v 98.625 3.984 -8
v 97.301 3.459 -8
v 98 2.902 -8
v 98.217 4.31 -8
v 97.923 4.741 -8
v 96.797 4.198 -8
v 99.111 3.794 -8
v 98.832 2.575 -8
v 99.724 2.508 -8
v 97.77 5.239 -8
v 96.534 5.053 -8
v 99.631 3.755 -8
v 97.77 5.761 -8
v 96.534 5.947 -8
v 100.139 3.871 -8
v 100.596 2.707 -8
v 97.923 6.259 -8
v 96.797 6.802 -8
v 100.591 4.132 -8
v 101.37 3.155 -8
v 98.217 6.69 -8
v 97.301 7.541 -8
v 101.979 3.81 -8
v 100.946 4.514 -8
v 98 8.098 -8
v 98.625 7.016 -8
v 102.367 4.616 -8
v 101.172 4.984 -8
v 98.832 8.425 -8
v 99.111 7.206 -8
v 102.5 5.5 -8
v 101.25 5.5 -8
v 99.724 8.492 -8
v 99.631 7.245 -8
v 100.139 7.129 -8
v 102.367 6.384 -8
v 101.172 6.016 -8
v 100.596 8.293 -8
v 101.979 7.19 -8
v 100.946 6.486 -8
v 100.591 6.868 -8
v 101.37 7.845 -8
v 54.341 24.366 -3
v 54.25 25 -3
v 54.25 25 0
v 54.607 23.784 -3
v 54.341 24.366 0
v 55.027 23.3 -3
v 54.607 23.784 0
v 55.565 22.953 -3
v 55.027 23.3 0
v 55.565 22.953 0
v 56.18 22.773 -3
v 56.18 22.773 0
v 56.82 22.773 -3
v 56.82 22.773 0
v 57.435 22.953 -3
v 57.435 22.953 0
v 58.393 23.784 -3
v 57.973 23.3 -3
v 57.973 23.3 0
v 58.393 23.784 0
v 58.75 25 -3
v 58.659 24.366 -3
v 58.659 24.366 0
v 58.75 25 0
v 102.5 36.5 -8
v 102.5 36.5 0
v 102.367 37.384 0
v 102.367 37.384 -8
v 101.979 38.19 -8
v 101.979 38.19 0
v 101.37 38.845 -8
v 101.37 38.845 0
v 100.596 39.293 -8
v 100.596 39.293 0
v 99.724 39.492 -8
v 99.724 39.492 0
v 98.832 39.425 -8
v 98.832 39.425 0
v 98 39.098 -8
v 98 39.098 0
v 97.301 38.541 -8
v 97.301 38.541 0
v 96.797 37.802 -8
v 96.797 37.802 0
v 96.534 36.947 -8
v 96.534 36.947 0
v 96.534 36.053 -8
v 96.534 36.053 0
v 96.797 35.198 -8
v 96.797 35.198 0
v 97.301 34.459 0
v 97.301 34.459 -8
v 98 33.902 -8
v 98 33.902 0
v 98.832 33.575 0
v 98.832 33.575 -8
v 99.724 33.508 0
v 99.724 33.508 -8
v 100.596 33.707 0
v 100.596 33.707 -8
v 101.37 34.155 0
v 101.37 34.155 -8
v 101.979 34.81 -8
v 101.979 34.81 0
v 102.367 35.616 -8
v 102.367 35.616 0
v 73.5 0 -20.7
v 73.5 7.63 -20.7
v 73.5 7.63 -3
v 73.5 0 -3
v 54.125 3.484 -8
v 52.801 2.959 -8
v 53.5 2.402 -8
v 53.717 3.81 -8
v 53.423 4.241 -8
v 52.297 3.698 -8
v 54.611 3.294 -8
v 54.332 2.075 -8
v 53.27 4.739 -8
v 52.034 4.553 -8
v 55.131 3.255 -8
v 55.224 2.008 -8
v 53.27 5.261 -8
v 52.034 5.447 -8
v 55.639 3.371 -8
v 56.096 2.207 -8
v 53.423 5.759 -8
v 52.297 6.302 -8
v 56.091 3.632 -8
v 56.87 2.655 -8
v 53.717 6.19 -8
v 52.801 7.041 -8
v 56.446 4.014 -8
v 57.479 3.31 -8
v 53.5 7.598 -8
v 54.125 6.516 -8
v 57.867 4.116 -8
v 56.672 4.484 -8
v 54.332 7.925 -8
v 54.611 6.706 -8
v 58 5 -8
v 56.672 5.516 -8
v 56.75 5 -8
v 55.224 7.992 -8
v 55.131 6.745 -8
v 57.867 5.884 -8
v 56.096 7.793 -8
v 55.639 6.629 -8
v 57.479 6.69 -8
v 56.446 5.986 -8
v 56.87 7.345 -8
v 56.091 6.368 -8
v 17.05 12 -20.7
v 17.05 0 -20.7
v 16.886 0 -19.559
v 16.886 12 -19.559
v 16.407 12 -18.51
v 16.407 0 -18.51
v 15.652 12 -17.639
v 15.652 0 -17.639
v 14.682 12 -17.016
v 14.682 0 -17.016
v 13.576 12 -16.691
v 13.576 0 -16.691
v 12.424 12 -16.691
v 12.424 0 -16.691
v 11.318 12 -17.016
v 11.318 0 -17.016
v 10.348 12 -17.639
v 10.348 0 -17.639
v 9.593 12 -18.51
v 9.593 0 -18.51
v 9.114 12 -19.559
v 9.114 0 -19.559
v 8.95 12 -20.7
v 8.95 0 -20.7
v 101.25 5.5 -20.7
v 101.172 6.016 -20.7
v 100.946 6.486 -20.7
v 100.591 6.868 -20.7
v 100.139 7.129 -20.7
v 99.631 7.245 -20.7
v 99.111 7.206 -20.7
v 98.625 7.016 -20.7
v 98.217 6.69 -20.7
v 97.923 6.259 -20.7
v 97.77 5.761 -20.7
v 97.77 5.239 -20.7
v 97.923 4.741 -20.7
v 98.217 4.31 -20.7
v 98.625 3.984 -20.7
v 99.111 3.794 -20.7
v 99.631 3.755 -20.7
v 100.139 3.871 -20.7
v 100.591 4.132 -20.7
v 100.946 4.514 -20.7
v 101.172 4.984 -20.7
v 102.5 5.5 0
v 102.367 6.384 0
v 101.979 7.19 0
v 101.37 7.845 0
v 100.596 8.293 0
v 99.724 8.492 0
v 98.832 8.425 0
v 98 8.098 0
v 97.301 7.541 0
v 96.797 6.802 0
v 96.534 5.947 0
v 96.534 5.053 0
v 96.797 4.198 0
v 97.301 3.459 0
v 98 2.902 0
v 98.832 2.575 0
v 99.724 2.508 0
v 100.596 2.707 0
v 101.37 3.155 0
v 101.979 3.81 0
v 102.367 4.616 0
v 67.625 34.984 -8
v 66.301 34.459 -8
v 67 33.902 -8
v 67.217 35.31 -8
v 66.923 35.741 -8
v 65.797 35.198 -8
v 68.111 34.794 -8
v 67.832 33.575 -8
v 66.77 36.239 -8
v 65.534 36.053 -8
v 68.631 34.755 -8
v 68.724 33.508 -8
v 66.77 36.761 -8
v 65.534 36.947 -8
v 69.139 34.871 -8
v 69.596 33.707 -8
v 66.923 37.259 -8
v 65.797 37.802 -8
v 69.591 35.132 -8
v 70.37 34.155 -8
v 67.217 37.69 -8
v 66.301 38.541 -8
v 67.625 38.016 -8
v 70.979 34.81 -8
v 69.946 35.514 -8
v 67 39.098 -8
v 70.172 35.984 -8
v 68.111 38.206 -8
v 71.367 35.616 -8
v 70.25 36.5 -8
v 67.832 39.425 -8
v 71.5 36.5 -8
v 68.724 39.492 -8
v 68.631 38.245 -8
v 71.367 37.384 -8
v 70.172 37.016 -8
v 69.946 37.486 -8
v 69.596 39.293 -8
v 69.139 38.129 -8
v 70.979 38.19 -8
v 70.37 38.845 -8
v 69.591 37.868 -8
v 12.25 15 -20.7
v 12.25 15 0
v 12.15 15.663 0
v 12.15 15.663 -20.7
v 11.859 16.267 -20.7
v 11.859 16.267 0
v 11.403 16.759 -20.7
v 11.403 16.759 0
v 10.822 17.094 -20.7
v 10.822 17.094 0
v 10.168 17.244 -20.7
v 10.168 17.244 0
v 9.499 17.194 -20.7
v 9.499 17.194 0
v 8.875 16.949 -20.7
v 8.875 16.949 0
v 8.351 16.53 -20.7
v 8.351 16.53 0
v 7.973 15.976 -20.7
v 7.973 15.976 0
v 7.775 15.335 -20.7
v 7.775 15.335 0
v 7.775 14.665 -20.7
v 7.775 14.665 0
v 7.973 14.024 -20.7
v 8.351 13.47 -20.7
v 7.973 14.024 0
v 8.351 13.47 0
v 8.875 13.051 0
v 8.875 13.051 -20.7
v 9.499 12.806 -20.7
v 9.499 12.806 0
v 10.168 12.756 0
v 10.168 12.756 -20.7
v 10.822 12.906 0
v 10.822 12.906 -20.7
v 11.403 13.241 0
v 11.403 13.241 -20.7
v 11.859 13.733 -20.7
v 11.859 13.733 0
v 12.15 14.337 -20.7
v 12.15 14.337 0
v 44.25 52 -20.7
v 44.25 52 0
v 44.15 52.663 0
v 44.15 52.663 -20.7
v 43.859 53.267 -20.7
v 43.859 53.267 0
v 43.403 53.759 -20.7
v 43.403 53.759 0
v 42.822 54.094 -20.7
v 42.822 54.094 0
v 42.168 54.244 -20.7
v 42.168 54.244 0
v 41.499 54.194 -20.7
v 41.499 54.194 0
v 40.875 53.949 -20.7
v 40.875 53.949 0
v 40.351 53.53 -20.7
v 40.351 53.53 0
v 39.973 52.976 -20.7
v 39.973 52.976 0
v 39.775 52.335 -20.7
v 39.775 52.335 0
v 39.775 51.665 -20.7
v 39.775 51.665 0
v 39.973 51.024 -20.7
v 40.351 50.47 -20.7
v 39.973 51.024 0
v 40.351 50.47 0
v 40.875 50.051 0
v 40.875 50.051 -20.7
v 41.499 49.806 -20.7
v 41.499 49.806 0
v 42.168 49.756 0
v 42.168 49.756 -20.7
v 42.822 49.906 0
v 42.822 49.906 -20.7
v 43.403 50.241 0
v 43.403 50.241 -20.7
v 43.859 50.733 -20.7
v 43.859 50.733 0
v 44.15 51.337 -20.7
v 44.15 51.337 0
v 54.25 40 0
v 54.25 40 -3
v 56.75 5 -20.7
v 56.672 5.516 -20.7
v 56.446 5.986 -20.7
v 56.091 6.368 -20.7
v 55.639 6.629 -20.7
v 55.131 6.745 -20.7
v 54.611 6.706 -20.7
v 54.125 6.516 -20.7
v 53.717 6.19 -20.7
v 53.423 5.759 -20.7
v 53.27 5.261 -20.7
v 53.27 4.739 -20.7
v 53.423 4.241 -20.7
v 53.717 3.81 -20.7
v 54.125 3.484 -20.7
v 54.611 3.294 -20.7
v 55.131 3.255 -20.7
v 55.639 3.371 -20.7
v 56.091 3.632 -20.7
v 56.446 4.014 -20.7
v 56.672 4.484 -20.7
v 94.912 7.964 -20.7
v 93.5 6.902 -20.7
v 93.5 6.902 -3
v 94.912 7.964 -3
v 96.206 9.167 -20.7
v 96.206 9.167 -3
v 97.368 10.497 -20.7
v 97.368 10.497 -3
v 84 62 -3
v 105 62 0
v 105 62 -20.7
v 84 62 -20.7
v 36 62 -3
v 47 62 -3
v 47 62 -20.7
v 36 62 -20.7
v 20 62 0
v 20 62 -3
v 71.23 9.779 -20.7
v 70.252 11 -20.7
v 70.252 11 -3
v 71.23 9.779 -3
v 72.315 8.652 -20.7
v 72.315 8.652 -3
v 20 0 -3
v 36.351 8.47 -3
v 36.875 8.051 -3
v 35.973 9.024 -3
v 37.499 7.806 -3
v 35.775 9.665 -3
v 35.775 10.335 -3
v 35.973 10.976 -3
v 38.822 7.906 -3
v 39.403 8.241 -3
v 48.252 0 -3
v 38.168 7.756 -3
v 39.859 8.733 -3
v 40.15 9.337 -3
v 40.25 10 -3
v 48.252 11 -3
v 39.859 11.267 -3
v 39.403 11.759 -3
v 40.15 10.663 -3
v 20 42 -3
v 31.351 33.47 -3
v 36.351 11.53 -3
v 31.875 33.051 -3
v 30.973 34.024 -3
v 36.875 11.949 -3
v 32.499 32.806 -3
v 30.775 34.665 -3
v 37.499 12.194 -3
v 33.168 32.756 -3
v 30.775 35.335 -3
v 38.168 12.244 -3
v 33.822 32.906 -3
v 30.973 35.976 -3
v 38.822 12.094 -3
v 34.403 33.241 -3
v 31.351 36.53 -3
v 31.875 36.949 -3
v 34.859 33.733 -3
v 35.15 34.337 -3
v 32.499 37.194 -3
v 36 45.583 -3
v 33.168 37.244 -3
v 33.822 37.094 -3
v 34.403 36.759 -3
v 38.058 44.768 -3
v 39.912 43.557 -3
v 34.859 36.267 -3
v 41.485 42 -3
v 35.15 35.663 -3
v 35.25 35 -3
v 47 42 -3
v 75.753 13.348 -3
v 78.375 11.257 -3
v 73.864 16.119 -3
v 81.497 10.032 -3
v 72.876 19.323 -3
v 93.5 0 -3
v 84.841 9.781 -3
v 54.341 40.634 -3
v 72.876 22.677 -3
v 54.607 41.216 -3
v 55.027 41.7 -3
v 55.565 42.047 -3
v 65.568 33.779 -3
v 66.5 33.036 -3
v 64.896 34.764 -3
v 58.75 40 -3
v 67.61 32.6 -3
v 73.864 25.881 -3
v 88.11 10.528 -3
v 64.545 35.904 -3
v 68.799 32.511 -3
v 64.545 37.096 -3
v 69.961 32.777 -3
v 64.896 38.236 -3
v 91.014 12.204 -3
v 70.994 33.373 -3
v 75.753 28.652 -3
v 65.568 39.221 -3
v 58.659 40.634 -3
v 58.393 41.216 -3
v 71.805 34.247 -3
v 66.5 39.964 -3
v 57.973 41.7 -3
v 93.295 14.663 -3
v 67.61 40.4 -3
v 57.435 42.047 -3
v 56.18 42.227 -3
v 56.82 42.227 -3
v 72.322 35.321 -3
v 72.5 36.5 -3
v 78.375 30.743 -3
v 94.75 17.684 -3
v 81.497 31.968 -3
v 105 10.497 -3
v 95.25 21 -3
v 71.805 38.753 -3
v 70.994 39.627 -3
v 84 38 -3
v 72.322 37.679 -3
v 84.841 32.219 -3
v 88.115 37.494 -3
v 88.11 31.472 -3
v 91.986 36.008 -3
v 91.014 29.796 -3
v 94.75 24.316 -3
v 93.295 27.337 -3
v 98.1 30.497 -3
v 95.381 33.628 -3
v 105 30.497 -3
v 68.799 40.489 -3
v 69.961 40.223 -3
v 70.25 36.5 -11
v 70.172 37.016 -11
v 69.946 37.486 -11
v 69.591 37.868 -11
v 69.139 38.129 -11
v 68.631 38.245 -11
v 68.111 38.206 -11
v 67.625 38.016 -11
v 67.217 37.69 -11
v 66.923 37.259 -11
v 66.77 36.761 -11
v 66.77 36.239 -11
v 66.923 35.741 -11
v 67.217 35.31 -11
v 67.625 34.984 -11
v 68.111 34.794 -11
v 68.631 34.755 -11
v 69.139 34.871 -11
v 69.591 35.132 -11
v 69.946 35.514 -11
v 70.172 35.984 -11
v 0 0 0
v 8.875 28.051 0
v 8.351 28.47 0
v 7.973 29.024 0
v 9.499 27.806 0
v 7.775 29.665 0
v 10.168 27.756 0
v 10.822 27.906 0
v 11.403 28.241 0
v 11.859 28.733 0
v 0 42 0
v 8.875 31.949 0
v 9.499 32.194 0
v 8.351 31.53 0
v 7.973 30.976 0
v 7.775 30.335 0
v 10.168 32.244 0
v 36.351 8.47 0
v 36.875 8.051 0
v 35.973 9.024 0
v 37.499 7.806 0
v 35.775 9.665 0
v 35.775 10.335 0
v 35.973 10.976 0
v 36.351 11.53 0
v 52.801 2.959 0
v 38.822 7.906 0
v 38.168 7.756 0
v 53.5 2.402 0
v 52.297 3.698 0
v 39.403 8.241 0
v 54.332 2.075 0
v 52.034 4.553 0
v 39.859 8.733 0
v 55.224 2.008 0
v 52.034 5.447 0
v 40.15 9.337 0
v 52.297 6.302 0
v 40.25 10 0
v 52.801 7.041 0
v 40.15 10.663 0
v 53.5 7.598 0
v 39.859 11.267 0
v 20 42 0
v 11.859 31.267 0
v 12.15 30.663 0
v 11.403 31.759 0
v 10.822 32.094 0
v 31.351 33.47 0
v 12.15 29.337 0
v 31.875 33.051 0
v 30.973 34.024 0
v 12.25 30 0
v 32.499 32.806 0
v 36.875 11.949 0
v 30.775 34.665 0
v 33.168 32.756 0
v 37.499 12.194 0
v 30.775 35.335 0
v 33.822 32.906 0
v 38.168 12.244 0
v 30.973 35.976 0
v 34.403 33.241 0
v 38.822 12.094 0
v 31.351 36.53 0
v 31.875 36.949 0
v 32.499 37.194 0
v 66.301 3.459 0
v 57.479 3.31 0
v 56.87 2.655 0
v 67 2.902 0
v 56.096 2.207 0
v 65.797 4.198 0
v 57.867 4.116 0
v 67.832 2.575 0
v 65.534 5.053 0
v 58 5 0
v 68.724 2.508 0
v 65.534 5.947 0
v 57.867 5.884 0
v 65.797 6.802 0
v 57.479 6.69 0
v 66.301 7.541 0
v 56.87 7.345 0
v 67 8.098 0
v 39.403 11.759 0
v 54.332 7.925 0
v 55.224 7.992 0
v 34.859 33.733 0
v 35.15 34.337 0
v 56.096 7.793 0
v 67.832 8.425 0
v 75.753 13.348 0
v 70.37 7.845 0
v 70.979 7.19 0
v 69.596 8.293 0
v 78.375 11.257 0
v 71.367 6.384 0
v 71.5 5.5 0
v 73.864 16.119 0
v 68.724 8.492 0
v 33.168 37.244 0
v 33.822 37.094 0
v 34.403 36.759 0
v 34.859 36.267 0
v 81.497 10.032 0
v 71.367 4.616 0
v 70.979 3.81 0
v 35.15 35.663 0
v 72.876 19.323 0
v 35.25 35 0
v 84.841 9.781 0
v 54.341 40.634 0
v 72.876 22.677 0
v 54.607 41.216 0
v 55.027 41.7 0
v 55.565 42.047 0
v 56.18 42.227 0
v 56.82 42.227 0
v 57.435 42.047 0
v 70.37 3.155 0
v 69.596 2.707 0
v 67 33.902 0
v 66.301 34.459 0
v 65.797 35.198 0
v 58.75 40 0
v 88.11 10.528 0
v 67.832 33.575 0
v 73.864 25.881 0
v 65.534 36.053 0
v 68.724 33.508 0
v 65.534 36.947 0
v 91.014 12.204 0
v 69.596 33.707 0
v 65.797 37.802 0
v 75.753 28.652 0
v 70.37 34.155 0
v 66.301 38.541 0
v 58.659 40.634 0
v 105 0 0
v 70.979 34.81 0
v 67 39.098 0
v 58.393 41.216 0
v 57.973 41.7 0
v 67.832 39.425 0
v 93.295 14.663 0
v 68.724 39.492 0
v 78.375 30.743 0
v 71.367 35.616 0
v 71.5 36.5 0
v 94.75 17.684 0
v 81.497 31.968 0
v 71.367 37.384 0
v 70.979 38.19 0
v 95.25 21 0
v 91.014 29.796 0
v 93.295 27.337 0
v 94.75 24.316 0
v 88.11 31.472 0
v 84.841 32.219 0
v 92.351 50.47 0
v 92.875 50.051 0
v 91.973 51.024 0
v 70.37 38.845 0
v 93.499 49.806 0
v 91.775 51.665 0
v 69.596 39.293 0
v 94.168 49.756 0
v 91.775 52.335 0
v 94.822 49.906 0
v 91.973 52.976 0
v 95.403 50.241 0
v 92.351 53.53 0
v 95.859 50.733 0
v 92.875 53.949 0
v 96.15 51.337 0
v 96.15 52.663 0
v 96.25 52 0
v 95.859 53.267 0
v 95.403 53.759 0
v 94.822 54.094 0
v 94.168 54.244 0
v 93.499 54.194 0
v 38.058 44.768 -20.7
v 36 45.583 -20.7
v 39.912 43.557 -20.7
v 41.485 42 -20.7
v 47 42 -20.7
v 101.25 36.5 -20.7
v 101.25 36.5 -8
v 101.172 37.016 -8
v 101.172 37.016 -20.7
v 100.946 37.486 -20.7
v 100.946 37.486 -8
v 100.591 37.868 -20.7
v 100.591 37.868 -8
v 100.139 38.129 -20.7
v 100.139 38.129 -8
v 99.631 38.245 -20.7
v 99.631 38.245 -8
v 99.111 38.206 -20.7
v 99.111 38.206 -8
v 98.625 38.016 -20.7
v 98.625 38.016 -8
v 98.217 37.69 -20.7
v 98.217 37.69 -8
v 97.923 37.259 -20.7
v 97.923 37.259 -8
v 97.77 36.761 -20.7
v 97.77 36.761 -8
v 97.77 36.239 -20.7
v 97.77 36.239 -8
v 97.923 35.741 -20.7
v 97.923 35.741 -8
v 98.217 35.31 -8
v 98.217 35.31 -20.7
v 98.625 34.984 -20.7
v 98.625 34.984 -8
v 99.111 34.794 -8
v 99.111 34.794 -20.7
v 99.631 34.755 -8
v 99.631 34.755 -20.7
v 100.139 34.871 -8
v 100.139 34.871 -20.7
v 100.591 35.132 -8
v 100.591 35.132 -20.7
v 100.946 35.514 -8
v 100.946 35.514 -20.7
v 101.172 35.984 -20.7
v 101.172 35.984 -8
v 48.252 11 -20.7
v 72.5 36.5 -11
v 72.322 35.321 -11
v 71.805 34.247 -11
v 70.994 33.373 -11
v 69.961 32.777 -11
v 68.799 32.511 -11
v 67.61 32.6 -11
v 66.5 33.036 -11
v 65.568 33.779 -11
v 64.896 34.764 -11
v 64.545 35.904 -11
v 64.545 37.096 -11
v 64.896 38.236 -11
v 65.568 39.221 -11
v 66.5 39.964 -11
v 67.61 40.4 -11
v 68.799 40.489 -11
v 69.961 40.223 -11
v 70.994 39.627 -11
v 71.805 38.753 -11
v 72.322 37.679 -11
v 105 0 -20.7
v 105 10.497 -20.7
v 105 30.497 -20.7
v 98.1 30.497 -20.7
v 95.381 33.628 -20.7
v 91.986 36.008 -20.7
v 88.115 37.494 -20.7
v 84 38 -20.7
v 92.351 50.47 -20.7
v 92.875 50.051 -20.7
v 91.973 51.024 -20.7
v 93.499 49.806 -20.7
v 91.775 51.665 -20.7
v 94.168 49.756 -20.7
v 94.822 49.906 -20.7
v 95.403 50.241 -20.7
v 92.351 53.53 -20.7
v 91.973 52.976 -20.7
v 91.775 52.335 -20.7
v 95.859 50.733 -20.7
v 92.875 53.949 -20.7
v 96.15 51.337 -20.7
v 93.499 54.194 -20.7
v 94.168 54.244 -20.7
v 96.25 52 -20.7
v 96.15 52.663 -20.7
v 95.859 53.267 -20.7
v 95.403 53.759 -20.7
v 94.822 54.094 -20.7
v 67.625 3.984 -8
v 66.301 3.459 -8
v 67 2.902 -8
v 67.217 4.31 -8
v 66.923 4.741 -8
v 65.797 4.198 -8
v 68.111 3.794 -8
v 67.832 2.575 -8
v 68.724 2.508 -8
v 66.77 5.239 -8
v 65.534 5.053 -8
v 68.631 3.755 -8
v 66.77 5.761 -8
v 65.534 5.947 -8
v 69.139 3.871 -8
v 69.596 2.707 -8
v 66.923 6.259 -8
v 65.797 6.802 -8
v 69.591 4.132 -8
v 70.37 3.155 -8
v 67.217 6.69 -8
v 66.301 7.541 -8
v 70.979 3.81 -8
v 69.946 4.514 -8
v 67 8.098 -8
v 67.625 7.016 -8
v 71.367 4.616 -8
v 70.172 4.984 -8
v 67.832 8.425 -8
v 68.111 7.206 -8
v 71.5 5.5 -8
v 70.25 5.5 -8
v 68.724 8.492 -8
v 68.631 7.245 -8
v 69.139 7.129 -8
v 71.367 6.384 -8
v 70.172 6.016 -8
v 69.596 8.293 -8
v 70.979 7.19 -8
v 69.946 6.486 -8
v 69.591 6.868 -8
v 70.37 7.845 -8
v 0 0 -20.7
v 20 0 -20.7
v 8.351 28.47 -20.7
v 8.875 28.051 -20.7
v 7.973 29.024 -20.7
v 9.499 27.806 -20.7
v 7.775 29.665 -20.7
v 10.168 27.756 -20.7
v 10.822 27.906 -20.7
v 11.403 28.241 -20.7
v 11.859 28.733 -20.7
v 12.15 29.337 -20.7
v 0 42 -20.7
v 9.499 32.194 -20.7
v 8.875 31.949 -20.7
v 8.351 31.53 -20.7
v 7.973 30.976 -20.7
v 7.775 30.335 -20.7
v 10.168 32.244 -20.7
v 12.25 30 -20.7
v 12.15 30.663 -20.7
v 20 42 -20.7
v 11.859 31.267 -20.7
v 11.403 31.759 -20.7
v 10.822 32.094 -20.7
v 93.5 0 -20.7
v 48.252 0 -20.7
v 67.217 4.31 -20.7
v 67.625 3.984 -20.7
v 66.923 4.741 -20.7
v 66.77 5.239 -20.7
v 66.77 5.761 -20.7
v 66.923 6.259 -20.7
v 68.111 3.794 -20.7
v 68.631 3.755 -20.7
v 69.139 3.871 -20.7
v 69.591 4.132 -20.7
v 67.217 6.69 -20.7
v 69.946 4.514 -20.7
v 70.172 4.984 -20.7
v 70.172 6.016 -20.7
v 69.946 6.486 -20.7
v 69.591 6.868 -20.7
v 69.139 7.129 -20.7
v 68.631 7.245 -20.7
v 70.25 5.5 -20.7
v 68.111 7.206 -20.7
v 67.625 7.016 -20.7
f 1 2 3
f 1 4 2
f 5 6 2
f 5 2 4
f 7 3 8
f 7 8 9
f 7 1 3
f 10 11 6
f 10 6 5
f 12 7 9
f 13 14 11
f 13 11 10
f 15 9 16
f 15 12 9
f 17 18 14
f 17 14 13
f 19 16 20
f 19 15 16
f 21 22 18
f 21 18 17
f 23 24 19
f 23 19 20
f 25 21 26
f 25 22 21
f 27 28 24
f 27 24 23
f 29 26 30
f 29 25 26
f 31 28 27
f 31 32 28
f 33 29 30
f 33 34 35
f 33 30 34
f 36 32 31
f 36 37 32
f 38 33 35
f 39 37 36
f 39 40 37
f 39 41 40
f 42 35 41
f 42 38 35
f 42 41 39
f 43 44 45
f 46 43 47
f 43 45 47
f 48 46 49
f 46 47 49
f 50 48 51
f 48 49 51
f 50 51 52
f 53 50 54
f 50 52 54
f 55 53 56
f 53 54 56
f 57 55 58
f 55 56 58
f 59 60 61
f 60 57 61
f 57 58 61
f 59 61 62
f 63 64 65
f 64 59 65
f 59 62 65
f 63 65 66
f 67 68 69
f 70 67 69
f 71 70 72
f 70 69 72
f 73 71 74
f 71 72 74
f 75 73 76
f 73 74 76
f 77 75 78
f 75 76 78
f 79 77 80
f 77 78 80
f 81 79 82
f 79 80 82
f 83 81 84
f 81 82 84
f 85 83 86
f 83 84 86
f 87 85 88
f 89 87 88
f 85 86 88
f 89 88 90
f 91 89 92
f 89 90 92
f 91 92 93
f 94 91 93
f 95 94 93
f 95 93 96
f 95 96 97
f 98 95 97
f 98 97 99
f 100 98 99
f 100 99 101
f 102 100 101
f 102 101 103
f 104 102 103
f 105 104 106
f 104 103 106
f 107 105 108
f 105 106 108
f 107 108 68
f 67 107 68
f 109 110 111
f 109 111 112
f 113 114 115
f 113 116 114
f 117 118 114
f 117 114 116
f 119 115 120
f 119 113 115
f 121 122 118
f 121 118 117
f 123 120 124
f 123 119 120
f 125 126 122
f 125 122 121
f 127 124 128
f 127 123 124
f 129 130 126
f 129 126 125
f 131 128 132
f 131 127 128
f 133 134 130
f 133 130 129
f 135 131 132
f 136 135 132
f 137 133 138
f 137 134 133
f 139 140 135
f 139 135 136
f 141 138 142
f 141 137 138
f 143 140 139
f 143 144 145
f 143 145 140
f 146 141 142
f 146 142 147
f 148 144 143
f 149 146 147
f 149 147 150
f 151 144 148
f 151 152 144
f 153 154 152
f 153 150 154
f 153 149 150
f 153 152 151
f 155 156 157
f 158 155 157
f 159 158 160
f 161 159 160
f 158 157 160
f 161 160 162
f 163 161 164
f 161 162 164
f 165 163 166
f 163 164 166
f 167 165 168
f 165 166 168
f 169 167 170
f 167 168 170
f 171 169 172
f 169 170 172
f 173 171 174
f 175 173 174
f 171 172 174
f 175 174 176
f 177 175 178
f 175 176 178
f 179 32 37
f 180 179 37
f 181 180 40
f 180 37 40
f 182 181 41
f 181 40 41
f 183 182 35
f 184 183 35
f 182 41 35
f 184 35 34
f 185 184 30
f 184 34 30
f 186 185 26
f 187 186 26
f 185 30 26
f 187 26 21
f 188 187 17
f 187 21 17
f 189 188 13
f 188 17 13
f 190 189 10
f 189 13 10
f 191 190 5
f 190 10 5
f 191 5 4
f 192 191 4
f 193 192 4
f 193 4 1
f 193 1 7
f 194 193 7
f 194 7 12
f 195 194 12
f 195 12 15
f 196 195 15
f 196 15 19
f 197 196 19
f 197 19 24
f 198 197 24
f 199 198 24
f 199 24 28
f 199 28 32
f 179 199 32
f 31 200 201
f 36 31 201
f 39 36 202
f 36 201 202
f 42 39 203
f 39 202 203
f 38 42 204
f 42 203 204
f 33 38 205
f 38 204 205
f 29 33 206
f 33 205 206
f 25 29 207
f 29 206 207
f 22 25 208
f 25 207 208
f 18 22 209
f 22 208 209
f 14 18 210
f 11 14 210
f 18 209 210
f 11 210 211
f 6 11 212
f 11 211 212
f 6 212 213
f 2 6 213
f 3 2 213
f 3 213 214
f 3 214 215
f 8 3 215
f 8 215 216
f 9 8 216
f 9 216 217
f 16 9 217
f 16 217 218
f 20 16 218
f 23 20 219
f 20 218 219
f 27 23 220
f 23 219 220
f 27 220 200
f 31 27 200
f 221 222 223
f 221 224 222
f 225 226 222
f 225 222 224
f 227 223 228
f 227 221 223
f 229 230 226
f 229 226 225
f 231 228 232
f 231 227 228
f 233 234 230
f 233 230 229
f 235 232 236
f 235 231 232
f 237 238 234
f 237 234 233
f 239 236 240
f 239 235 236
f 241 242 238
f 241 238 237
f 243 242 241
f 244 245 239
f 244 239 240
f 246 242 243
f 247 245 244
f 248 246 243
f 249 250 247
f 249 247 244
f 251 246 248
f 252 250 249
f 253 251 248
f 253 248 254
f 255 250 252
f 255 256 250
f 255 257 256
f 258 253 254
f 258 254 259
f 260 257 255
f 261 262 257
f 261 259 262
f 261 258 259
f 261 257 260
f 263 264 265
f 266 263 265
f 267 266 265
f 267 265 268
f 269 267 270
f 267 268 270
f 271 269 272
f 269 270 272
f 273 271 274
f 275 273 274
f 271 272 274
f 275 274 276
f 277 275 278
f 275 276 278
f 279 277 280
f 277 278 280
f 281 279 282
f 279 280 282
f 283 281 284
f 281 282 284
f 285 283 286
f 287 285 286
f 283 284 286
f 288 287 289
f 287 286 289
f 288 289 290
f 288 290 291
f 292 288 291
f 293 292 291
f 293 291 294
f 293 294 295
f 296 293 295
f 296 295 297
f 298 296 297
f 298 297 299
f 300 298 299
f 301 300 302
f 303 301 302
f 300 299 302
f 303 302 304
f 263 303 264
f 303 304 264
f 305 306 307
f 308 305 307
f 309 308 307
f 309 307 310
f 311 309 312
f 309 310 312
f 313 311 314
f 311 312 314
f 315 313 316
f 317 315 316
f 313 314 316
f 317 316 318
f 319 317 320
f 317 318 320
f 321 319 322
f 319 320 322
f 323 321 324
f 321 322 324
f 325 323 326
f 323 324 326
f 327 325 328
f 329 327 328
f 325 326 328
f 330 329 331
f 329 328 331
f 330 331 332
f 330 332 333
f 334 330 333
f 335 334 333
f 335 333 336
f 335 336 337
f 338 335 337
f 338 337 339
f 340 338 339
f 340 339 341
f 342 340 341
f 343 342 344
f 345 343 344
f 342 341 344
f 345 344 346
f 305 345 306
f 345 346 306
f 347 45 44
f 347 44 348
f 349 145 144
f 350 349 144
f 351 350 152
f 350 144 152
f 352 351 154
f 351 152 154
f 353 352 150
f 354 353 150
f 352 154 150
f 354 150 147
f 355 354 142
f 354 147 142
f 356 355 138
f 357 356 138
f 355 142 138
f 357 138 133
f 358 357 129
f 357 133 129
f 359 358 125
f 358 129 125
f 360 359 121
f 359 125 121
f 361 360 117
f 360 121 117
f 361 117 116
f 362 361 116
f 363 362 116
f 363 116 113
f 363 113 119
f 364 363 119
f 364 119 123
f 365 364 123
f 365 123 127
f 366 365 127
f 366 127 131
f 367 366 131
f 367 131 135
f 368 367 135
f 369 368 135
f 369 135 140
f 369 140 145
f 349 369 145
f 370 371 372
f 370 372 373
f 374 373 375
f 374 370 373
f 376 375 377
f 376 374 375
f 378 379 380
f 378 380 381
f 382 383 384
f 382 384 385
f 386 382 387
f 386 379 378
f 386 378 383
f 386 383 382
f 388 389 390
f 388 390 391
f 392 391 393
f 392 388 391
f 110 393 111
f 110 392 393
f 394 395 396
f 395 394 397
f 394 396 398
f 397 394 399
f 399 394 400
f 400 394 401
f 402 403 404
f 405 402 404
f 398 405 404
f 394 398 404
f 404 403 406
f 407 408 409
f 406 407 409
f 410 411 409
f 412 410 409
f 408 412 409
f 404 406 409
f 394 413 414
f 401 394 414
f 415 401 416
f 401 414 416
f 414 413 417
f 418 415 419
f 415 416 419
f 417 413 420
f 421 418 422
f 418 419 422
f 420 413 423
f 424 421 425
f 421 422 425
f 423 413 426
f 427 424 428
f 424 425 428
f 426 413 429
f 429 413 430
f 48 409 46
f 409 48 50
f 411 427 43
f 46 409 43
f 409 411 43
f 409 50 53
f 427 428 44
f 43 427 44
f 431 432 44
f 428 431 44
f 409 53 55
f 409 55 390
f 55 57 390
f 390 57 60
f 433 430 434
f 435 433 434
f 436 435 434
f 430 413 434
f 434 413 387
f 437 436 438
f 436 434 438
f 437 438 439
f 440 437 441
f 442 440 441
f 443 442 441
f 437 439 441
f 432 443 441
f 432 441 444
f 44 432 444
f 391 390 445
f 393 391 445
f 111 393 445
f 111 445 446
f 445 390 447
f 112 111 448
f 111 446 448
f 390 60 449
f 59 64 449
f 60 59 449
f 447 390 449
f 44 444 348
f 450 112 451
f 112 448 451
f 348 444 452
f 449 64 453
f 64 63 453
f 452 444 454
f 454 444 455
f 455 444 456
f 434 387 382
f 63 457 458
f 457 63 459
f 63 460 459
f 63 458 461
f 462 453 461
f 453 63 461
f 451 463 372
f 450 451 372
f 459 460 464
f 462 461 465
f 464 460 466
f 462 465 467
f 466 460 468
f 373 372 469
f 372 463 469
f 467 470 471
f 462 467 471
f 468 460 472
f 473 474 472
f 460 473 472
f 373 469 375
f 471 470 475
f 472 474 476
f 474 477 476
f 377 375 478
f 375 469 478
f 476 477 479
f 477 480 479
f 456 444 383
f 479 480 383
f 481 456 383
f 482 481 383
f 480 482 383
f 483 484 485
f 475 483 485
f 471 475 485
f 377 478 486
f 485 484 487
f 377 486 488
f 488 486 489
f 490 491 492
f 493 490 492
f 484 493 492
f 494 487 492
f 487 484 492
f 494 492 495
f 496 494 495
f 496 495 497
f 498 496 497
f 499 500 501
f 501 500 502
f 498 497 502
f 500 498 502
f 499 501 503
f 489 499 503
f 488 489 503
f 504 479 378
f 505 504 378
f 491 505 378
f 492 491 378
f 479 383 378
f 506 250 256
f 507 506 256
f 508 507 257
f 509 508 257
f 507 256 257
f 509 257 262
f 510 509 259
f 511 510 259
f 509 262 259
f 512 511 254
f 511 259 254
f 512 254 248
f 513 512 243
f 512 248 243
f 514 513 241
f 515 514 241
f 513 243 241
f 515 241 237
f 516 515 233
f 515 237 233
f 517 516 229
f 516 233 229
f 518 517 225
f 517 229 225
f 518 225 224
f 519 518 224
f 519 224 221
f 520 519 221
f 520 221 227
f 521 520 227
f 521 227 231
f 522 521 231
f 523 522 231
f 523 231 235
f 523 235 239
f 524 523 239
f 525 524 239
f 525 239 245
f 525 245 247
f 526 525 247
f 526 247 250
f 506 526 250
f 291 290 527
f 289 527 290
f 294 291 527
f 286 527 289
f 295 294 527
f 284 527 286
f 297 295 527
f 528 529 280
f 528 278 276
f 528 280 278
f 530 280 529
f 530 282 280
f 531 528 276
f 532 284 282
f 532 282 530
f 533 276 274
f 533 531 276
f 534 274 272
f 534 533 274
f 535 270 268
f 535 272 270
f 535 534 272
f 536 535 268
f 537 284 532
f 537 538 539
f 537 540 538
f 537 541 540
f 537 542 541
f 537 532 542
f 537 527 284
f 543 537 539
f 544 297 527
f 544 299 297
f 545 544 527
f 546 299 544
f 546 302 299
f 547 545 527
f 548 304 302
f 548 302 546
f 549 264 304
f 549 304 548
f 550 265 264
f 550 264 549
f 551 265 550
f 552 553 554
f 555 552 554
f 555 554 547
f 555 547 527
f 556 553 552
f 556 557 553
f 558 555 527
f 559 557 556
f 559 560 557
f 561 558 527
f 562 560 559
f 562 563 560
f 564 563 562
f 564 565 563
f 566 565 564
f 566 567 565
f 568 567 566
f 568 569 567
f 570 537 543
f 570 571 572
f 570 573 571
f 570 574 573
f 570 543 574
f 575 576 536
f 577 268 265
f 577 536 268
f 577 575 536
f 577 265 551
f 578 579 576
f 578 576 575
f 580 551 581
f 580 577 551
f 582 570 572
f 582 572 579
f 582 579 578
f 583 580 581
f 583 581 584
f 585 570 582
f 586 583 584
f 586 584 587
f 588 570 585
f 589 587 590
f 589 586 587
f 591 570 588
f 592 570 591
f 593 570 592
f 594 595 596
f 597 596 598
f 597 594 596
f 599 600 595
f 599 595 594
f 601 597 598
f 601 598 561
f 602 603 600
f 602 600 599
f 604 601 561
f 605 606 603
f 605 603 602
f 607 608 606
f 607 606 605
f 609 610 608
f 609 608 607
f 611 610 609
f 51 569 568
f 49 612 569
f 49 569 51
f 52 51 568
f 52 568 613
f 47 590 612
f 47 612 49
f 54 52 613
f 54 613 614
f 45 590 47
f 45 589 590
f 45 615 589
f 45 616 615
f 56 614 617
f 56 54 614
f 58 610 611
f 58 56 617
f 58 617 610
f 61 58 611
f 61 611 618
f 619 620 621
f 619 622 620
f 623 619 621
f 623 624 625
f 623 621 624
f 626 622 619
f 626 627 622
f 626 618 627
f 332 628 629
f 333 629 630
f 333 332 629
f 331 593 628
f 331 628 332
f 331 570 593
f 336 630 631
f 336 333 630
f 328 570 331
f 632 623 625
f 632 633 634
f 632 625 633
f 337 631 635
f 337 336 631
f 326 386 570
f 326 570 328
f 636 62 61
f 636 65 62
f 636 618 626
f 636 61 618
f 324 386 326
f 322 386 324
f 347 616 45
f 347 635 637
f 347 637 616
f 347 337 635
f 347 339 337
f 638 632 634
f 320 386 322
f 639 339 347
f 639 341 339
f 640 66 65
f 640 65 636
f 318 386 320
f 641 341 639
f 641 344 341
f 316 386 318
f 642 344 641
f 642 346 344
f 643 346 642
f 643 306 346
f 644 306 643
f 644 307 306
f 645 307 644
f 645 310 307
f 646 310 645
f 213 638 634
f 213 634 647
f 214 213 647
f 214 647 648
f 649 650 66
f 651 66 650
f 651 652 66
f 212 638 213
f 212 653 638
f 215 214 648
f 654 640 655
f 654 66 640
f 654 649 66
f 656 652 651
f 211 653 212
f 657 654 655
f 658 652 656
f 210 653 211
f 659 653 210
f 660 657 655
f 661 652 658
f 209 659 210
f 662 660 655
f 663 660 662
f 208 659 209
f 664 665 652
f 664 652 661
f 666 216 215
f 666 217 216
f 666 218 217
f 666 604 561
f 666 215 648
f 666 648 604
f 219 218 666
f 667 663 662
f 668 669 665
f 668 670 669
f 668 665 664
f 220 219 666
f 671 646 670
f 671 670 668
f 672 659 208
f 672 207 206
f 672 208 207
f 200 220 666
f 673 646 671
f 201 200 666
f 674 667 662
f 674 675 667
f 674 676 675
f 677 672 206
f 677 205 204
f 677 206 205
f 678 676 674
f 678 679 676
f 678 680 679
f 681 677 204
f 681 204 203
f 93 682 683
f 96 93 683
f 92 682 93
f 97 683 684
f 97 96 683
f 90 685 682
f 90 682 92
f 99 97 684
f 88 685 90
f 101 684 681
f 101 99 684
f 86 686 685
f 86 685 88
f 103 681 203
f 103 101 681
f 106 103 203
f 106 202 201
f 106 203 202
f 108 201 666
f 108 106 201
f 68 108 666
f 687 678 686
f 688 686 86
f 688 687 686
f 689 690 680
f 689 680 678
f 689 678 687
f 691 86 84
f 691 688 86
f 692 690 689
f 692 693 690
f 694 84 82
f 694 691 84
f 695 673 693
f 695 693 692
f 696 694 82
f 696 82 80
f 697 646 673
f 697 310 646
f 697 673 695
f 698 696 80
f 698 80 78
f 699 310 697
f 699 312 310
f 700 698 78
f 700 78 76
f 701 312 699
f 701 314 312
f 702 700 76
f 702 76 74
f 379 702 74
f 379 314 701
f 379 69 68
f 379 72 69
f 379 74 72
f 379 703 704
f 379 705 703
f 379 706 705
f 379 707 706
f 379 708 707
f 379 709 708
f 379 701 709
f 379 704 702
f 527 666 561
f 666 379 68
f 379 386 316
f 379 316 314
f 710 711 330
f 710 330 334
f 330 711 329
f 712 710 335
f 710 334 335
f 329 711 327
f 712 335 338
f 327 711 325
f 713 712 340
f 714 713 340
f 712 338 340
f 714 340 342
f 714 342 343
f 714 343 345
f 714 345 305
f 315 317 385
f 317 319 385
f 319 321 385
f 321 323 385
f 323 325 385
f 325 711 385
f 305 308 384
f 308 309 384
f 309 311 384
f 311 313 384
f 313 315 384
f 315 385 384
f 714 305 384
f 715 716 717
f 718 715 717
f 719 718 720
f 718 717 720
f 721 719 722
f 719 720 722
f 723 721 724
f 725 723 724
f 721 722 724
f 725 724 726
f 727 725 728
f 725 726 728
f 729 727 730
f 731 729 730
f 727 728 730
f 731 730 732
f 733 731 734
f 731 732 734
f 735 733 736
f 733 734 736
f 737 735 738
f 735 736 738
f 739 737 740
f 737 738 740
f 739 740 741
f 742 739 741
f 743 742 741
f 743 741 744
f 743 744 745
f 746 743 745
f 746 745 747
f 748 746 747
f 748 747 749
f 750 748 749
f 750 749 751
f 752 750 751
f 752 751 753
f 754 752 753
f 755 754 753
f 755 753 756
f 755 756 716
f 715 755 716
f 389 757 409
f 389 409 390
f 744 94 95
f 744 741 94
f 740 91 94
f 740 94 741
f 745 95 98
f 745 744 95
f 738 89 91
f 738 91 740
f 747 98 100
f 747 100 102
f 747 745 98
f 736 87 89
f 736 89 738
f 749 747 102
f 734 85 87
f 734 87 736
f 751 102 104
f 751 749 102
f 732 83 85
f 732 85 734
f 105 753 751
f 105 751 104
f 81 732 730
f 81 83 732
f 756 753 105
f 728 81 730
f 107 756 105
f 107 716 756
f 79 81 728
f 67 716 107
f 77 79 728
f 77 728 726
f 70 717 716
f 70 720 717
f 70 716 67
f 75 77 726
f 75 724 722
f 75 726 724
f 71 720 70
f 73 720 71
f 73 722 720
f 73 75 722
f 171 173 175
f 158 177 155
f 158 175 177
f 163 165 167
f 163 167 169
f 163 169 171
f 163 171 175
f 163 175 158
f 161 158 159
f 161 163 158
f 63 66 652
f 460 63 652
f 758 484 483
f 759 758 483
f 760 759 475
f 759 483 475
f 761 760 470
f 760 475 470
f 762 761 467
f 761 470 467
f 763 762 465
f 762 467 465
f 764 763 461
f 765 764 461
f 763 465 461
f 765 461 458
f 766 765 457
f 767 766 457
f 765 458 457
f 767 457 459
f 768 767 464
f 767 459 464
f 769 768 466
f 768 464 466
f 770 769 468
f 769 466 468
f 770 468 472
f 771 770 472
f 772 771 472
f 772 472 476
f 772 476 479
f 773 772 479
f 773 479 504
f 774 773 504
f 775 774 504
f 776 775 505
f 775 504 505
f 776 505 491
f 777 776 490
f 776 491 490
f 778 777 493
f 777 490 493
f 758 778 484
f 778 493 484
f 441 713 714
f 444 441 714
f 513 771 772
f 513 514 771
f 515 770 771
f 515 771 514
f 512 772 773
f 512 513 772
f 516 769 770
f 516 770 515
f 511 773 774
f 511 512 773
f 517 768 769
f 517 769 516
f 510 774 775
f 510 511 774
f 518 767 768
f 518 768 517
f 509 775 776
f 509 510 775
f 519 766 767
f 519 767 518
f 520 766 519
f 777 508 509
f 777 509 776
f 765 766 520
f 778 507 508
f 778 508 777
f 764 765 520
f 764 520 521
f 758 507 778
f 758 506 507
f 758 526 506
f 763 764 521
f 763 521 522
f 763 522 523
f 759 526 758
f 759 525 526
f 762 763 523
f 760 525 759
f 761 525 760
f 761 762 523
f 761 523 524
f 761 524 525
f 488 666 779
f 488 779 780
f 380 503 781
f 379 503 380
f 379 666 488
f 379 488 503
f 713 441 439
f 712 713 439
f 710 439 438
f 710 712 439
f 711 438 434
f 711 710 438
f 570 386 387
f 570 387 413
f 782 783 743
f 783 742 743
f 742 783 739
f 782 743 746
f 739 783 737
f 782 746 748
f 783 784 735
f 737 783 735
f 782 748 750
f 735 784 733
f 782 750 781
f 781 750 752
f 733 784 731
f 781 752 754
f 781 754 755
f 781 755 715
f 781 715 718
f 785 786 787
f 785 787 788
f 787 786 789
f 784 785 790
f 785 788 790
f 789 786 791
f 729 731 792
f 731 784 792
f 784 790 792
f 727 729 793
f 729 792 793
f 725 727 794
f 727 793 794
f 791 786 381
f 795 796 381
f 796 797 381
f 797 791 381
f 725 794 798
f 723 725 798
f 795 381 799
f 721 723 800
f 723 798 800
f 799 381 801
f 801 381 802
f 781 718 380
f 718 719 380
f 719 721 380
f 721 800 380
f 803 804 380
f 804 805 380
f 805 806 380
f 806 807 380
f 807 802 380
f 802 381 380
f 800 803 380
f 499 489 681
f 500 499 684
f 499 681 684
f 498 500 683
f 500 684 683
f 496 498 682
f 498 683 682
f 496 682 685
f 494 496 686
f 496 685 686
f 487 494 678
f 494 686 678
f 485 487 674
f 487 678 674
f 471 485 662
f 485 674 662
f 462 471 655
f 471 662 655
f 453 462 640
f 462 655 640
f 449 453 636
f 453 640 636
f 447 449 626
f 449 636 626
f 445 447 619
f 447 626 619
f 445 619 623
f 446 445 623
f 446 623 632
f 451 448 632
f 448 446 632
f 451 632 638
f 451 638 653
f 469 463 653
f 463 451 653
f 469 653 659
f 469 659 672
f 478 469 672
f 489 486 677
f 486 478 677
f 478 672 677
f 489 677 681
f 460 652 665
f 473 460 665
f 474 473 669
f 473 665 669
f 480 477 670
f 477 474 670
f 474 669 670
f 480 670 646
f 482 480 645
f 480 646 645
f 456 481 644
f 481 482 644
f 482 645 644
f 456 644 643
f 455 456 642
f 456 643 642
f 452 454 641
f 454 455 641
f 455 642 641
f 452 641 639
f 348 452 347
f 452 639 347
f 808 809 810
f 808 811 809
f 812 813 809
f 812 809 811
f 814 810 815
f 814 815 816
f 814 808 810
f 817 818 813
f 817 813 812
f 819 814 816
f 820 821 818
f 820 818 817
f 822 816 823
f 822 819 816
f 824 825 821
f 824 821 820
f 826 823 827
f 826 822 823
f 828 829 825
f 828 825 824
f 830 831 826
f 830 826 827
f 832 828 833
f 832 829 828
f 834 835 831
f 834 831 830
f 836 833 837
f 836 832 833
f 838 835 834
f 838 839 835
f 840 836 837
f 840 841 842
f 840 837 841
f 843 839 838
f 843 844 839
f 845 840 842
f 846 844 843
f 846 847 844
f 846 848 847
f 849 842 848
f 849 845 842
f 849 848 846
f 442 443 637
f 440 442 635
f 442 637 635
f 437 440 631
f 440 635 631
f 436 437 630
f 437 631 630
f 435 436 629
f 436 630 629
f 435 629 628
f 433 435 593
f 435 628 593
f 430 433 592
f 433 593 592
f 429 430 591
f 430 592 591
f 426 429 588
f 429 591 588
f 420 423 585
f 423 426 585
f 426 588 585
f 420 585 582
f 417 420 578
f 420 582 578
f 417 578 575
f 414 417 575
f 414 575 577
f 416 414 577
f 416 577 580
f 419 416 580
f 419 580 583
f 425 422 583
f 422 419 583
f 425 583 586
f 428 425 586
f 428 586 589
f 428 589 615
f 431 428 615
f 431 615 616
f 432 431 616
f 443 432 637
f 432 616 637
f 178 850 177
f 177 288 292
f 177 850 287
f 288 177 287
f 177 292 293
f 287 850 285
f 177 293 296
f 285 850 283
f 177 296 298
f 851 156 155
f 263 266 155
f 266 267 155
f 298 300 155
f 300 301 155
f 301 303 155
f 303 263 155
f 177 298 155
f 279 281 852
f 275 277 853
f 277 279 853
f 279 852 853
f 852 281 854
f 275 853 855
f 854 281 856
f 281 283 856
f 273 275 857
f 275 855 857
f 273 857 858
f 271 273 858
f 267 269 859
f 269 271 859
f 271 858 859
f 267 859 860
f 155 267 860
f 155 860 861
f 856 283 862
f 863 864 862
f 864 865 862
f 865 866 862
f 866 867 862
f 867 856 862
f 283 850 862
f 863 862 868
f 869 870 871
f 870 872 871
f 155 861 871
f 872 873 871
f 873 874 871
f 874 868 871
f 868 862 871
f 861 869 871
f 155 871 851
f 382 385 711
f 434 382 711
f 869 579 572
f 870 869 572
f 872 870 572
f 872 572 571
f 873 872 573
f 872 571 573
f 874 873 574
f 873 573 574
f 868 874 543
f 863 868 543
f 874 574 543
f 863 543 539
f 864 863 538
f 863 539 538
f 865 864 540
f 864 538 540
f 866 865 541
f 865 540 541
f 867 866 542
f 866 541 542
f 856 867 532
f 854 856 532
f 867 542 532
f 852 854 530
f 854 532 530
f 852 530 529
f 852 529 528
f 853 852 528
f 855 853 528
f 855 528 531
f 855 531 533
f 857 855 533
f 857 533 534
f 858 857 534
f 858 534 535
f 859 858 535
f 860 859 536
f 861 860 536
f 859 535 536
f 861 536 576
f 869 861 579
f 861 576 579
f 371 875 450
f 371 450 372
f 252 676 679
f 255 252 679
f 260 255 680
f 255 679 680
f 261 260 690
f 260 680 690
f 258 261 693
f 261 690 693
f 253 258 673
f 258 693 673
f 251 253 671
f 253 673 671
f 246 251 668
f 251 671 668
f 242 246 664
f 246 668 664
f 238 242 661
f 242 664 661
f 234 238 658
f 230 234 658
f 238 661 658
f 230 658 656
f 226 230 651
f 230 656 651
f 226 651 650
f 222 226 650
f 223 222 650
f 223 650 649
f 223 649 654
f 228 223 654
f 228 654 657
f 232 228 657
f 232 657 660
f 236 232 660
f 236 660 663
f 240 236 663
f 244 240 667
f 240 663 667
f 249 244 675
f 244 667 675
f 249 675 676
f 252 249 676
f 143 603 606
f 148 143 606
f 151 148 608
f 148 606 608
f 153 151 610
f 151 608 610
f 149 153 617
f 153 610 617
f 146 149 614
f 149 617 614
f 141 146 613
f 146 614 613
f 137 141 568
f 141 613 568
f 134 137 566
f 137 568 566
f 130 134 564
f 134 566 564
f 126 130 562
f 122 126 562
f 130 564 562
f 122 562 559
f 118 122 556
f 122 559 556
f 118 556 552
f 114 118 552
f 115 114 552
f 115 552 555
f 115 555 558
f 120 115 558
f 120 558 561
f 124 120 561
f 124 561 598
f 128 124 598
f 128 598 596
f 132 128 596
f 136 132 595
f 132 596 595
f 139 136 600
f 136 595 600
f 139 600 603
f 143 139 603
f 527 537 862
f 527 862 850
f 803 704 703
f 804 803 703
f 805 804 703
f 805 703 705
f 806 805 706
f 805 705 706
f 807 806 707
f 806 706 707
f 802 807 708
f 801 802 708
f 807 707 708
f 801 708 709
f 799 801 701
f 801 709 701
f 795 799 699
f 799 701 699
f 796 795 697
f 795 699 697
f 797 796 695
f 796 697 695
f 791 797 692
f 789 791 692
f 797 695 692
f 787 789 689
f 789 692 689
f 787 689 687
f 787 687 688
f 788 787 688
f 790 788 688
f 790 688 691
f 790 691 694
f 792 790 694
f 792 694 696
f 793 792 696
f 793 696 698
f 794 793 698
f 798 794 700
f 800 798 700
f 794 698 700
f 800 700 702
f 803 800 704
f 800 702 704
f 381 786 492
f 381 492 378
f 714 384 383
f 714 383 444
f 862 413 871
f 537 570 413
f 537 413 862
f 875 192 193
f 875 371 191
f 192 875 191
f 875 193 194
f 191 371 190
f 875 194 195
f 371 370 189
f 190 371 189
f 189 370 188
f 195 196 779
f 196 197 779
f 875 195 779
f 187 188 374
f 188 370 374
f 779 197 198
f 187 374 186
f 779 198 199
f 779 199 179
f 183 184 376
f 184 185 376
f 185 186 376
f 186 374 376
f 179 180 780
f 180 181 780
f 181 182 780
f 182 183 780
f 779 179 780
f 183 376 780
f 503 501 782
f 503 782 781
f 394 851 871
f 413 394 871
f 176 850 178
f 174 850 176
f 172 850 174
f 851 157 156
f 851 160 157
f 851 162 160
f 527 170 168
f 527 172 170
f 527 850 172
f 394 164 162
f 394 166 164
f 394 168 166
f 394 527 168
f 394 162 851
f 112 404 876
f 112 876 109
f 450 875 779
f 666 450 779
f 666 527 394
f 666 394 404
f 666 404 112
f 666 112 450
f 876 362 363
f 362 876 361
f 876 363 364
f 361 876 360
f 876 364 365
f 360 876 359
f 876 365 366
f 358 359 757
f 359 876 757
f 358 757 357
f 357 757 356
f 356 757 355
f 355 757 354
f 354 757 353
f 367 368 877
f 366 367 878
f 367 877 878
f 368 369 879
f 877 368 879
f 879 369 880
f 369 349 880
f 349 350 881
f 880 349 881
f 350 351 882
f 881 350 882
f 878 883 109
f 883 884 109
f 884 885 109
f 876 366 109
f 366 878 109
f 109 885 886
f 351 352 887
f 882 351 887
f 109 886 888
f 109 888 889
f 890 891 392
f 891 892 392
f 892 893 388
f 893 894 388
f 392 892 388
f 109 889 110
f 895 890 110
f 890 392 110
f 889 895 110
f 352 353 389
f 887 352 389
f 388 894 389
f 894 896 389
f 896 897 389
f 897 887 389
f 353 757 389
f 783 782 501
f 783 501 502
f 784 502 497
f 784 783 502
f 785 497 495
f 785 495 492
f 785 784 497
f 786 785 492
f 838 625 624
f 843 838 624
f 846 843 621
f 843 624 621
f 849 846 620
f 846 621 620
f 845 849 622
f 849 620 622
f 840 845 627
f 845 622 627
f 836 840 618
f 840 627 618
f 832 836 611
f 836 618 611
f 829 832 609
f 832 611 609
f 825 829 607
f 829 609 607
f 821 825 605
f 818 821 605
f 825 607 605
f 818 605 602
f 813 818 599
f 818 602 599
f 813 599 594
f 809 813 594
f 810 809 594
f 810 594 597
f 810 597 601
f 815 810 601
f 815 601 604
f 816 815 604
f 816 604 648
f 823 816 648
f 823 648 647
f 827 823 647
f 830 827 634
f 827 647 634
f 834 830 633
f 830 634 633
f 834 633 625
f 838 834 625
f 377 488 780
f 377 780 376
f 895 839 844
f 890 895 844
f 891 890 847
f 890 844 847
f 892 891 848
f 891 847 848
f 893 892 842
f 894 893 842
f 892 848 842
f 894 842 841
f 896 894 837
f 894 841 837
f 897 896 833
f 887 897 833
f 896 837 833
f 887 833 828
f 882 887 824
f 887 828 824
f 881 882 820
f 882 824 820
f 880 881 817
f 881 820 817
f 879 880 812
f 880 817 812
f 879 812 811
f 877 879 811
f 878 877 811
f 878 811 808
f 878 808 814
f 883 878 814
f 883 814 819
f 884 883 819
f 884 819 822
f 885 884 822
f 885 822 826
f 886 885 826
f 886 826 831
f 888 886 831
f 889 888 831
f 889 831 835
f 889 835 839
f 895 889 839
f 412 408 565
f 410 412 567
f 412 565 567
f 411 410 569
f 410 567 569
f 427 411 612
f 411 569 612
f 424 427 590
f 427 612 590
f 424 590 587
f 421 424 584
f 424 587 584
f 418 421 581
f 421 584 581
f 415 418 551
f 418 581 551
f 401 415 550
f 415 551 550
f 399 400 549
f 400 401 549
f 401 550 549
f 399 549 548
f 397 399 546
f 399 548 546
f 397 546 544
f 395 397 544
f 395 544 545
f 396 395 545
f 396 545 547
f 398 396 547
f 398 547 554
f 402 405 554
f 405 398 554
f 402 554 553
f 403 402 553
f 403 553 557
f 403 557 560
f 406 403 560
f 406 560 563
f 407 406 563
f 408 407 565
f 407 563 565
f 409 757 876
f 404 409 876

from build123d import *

# Parameters (mm, degrees)
SKETCH_R        = 2.25
SKETCH_R_2      = 11.25
SKETCH_R_3      = 1.75
PAD_DEPTH       = 20.7
POCKET_DEPTH    = 17.7
SKETCH002_R     = 4
PAD001_DEPTH    = 8
SKETCH003_R     = 3
POCKET001_DEPTH = 8
SKETCH004_R     = 1.75
POCKET002_DEPTH = 5
SKETCH005_R     = 4.05
POCKET003_DEPTH = 12
SKETCH006_R     = 1.75
POCKET004_DEPTH = 12.701


with BuildPart() as pocket_belt_path:
    # Sketch → Pad (new body)
    with BuildSketch(Plane.XY):
        Polygon((0, 0), (105, 0), (105, 62), (20, 62), (20, 42), (0, 42), align=None)
        with Locations((38, 10)):
            Circle(SKETCH_R, mode=Mode.SUBTRACT)
        with Locations((33, 35)):
            Circle(SKETCH_R, mode=Mode.SUBTRACT)
        with Locations((84, 21)):
            Circle(SKETCH_R_2, mode=Mode.SUBTRACT)
        with Locations((68.5, 36.5)):
            Circle(SKETCH_R_3, mode=Mode.SUBTRACT)
        with Locations((99.5, 36.5)):
            Circle(SKETCH_R_3, mode=Mode.SUBTRACT)
        with Locations((68.5, 5.5)):
            Circle(SKETCH_R_3, mode=Mode.SUBTRACT)
        with Locations((99.5, 5.5)):
            Circle(SKETCH_R_3, mode=Mode.SUBTRACT)
        with Locations((10, 30)):
            Circle(SKETCH_R, mode=Mode.SUBTRACT)
        with Locations((10, 15)):
            Circle(SKETCH_R, mode=Mode.SUBTRACT)
        with Locations((42, 52)):
            Circle(SKETCH_R, mode=Mode.SUBTRACT)
        with Locations((94, 52)):
            Circle(SKETCH_R, mode=Mode.SUBTRACT)
        with Locations((55, 5)):
            Circle(SKETCH_R_3, mode=Mode.SUBTRACT)
        with BuildLine():
            Line((58.75, 25.000001), (58.75, 40))
            ThreePointArc((58.75, 40), (56.5, 42.25), (54.25, 39.999999))
            Line((54.25, 25), (54.25, 39.999999))
            ThreePointArc((54.25, 25), (56.5, 22.75), (58.75, 25.000001))
        make_face(mode=Mode.SUBTRACT)
    extrude(amount=PAD_DEPTH)

    # Sketch001 → Pocket (cut)
    with BuildSketch(Plane.XY.offset(20.7)):
        with BuildLine():
            ThreePointArc((41.485277, 42), (39.015593, 44.209375), (35.999996, 45.583005))
            Line((35.999996, 67), (35.999996, 45.583005))
            Line((20, 67), (35.999996, 67))
            Line((20, -1), (20, 67))
            Line((20, -1), (48.252269, -1))
            Line((48.252269, 11), (48.252269, -1))
            Line((48.252269, 11), (70.252269, 11))
            ThreePointArc((70.252269, 11), (71.759618, 9.202833), (73.499996, 7.630258))
            Line((73.499996, 7.630258), (73.499996, -1))
            Line((73.499996, -1), (93.499996, -1))
            Line((93.499996, -1), (93.499996, 6.902128))
            ThreePointArc((93.499996, 6.902128), (95.574295, 8.548671), (97.367695, 10.497399))
            Line((105.499996, 10.497399), (97.367695, 10.497399))
            Line((105.499996, 30.497399), (105.499996, 10.497399))
            Line((98.099621, 30.497399), (105.499996, 30.497399))
            ThreePointArc((98.099621, 30.497399), (91.98574, 36.007594), (83.999996, 38))
            Line((83.999996, 38), (83.999996, 67))
            Line((83.999996, 67), (46.999996, 67))
            Line((46.999996, 67), (46.999996, 42))
            Line((41.485277, 42), (46.999996, 42))
        make_face()
    extrude(amount=-POCKET_DEPTH, mode=Mode.SUBTRACT)


with BuildPart() as pocket004:
    # Part__Mirroring: instance of Pocket belt path
    add(pocket_belt_path.part.mirror(Plane(origin=(52.5, 31, 0), x_dir=(0, 1, 0), z_dir=(0, 0, 1))))

    # Sketch002 → Pad001 (new body)
    with BuildSketch(Plane(origin=(0, 0, -3), x_dir=(1, 0, 0), z_dir=(0, 0, -1))):
        with Locations((68.5, -36.5)):
            Circle(SKETCH002_R)
    extrude(amount=PAD001_DEPTH)

    # Sketch003 → Pocket001 (cut)
    with BuildSketch(Plane.XY):
        with Locations((55, 5)):
            Circle(SKETCH003_R)
        with Locations((68.5, 36.5)):
            Circle(SKETCH003_R)
        with Locations((68.5, 5.5)):
            Circle(SKETCH003_R)
        with Locations((99.5, 36.5)):
            Circle(SKETCH003_R)
        with Locations((99.5, 5.5)):
            Circle(SKETCH003_R)
    extrude(amount=-POCKET001_DEPTH, mode=Mode.SUBTRACT)

    # Sketch004 → Pocket002 (cut)
    with BuildSketch(Plane.XY.offset(-8)):
        with Locations((94, 52)):
            Circle(SKETCH004_R)
    extrude(amount=-POCKET002_DEPTH, mode=Mode.SUBTRACT)

    # Sketch005 → Pocket003 (cut)
    with BuildSketch(Plane.XZ):
        with Locations((13, -20.7)):
            Circle(SKETCH005_R)
    extrude(amount=-POCKET003_DEPTH, mode=Mode.SUBTRACT)

    # Sketch006 → Pocket004 (cut, through all)
    with BuildSketch(Plane.XY.offset(-8)):
        with Locations((68.5, 36.5)):
            Circle(SKETCH006_R)
    extrude(amount=-POCKET004_DEPTH, mode=Mode.SUBTRACT)


solid = pocket004.part
